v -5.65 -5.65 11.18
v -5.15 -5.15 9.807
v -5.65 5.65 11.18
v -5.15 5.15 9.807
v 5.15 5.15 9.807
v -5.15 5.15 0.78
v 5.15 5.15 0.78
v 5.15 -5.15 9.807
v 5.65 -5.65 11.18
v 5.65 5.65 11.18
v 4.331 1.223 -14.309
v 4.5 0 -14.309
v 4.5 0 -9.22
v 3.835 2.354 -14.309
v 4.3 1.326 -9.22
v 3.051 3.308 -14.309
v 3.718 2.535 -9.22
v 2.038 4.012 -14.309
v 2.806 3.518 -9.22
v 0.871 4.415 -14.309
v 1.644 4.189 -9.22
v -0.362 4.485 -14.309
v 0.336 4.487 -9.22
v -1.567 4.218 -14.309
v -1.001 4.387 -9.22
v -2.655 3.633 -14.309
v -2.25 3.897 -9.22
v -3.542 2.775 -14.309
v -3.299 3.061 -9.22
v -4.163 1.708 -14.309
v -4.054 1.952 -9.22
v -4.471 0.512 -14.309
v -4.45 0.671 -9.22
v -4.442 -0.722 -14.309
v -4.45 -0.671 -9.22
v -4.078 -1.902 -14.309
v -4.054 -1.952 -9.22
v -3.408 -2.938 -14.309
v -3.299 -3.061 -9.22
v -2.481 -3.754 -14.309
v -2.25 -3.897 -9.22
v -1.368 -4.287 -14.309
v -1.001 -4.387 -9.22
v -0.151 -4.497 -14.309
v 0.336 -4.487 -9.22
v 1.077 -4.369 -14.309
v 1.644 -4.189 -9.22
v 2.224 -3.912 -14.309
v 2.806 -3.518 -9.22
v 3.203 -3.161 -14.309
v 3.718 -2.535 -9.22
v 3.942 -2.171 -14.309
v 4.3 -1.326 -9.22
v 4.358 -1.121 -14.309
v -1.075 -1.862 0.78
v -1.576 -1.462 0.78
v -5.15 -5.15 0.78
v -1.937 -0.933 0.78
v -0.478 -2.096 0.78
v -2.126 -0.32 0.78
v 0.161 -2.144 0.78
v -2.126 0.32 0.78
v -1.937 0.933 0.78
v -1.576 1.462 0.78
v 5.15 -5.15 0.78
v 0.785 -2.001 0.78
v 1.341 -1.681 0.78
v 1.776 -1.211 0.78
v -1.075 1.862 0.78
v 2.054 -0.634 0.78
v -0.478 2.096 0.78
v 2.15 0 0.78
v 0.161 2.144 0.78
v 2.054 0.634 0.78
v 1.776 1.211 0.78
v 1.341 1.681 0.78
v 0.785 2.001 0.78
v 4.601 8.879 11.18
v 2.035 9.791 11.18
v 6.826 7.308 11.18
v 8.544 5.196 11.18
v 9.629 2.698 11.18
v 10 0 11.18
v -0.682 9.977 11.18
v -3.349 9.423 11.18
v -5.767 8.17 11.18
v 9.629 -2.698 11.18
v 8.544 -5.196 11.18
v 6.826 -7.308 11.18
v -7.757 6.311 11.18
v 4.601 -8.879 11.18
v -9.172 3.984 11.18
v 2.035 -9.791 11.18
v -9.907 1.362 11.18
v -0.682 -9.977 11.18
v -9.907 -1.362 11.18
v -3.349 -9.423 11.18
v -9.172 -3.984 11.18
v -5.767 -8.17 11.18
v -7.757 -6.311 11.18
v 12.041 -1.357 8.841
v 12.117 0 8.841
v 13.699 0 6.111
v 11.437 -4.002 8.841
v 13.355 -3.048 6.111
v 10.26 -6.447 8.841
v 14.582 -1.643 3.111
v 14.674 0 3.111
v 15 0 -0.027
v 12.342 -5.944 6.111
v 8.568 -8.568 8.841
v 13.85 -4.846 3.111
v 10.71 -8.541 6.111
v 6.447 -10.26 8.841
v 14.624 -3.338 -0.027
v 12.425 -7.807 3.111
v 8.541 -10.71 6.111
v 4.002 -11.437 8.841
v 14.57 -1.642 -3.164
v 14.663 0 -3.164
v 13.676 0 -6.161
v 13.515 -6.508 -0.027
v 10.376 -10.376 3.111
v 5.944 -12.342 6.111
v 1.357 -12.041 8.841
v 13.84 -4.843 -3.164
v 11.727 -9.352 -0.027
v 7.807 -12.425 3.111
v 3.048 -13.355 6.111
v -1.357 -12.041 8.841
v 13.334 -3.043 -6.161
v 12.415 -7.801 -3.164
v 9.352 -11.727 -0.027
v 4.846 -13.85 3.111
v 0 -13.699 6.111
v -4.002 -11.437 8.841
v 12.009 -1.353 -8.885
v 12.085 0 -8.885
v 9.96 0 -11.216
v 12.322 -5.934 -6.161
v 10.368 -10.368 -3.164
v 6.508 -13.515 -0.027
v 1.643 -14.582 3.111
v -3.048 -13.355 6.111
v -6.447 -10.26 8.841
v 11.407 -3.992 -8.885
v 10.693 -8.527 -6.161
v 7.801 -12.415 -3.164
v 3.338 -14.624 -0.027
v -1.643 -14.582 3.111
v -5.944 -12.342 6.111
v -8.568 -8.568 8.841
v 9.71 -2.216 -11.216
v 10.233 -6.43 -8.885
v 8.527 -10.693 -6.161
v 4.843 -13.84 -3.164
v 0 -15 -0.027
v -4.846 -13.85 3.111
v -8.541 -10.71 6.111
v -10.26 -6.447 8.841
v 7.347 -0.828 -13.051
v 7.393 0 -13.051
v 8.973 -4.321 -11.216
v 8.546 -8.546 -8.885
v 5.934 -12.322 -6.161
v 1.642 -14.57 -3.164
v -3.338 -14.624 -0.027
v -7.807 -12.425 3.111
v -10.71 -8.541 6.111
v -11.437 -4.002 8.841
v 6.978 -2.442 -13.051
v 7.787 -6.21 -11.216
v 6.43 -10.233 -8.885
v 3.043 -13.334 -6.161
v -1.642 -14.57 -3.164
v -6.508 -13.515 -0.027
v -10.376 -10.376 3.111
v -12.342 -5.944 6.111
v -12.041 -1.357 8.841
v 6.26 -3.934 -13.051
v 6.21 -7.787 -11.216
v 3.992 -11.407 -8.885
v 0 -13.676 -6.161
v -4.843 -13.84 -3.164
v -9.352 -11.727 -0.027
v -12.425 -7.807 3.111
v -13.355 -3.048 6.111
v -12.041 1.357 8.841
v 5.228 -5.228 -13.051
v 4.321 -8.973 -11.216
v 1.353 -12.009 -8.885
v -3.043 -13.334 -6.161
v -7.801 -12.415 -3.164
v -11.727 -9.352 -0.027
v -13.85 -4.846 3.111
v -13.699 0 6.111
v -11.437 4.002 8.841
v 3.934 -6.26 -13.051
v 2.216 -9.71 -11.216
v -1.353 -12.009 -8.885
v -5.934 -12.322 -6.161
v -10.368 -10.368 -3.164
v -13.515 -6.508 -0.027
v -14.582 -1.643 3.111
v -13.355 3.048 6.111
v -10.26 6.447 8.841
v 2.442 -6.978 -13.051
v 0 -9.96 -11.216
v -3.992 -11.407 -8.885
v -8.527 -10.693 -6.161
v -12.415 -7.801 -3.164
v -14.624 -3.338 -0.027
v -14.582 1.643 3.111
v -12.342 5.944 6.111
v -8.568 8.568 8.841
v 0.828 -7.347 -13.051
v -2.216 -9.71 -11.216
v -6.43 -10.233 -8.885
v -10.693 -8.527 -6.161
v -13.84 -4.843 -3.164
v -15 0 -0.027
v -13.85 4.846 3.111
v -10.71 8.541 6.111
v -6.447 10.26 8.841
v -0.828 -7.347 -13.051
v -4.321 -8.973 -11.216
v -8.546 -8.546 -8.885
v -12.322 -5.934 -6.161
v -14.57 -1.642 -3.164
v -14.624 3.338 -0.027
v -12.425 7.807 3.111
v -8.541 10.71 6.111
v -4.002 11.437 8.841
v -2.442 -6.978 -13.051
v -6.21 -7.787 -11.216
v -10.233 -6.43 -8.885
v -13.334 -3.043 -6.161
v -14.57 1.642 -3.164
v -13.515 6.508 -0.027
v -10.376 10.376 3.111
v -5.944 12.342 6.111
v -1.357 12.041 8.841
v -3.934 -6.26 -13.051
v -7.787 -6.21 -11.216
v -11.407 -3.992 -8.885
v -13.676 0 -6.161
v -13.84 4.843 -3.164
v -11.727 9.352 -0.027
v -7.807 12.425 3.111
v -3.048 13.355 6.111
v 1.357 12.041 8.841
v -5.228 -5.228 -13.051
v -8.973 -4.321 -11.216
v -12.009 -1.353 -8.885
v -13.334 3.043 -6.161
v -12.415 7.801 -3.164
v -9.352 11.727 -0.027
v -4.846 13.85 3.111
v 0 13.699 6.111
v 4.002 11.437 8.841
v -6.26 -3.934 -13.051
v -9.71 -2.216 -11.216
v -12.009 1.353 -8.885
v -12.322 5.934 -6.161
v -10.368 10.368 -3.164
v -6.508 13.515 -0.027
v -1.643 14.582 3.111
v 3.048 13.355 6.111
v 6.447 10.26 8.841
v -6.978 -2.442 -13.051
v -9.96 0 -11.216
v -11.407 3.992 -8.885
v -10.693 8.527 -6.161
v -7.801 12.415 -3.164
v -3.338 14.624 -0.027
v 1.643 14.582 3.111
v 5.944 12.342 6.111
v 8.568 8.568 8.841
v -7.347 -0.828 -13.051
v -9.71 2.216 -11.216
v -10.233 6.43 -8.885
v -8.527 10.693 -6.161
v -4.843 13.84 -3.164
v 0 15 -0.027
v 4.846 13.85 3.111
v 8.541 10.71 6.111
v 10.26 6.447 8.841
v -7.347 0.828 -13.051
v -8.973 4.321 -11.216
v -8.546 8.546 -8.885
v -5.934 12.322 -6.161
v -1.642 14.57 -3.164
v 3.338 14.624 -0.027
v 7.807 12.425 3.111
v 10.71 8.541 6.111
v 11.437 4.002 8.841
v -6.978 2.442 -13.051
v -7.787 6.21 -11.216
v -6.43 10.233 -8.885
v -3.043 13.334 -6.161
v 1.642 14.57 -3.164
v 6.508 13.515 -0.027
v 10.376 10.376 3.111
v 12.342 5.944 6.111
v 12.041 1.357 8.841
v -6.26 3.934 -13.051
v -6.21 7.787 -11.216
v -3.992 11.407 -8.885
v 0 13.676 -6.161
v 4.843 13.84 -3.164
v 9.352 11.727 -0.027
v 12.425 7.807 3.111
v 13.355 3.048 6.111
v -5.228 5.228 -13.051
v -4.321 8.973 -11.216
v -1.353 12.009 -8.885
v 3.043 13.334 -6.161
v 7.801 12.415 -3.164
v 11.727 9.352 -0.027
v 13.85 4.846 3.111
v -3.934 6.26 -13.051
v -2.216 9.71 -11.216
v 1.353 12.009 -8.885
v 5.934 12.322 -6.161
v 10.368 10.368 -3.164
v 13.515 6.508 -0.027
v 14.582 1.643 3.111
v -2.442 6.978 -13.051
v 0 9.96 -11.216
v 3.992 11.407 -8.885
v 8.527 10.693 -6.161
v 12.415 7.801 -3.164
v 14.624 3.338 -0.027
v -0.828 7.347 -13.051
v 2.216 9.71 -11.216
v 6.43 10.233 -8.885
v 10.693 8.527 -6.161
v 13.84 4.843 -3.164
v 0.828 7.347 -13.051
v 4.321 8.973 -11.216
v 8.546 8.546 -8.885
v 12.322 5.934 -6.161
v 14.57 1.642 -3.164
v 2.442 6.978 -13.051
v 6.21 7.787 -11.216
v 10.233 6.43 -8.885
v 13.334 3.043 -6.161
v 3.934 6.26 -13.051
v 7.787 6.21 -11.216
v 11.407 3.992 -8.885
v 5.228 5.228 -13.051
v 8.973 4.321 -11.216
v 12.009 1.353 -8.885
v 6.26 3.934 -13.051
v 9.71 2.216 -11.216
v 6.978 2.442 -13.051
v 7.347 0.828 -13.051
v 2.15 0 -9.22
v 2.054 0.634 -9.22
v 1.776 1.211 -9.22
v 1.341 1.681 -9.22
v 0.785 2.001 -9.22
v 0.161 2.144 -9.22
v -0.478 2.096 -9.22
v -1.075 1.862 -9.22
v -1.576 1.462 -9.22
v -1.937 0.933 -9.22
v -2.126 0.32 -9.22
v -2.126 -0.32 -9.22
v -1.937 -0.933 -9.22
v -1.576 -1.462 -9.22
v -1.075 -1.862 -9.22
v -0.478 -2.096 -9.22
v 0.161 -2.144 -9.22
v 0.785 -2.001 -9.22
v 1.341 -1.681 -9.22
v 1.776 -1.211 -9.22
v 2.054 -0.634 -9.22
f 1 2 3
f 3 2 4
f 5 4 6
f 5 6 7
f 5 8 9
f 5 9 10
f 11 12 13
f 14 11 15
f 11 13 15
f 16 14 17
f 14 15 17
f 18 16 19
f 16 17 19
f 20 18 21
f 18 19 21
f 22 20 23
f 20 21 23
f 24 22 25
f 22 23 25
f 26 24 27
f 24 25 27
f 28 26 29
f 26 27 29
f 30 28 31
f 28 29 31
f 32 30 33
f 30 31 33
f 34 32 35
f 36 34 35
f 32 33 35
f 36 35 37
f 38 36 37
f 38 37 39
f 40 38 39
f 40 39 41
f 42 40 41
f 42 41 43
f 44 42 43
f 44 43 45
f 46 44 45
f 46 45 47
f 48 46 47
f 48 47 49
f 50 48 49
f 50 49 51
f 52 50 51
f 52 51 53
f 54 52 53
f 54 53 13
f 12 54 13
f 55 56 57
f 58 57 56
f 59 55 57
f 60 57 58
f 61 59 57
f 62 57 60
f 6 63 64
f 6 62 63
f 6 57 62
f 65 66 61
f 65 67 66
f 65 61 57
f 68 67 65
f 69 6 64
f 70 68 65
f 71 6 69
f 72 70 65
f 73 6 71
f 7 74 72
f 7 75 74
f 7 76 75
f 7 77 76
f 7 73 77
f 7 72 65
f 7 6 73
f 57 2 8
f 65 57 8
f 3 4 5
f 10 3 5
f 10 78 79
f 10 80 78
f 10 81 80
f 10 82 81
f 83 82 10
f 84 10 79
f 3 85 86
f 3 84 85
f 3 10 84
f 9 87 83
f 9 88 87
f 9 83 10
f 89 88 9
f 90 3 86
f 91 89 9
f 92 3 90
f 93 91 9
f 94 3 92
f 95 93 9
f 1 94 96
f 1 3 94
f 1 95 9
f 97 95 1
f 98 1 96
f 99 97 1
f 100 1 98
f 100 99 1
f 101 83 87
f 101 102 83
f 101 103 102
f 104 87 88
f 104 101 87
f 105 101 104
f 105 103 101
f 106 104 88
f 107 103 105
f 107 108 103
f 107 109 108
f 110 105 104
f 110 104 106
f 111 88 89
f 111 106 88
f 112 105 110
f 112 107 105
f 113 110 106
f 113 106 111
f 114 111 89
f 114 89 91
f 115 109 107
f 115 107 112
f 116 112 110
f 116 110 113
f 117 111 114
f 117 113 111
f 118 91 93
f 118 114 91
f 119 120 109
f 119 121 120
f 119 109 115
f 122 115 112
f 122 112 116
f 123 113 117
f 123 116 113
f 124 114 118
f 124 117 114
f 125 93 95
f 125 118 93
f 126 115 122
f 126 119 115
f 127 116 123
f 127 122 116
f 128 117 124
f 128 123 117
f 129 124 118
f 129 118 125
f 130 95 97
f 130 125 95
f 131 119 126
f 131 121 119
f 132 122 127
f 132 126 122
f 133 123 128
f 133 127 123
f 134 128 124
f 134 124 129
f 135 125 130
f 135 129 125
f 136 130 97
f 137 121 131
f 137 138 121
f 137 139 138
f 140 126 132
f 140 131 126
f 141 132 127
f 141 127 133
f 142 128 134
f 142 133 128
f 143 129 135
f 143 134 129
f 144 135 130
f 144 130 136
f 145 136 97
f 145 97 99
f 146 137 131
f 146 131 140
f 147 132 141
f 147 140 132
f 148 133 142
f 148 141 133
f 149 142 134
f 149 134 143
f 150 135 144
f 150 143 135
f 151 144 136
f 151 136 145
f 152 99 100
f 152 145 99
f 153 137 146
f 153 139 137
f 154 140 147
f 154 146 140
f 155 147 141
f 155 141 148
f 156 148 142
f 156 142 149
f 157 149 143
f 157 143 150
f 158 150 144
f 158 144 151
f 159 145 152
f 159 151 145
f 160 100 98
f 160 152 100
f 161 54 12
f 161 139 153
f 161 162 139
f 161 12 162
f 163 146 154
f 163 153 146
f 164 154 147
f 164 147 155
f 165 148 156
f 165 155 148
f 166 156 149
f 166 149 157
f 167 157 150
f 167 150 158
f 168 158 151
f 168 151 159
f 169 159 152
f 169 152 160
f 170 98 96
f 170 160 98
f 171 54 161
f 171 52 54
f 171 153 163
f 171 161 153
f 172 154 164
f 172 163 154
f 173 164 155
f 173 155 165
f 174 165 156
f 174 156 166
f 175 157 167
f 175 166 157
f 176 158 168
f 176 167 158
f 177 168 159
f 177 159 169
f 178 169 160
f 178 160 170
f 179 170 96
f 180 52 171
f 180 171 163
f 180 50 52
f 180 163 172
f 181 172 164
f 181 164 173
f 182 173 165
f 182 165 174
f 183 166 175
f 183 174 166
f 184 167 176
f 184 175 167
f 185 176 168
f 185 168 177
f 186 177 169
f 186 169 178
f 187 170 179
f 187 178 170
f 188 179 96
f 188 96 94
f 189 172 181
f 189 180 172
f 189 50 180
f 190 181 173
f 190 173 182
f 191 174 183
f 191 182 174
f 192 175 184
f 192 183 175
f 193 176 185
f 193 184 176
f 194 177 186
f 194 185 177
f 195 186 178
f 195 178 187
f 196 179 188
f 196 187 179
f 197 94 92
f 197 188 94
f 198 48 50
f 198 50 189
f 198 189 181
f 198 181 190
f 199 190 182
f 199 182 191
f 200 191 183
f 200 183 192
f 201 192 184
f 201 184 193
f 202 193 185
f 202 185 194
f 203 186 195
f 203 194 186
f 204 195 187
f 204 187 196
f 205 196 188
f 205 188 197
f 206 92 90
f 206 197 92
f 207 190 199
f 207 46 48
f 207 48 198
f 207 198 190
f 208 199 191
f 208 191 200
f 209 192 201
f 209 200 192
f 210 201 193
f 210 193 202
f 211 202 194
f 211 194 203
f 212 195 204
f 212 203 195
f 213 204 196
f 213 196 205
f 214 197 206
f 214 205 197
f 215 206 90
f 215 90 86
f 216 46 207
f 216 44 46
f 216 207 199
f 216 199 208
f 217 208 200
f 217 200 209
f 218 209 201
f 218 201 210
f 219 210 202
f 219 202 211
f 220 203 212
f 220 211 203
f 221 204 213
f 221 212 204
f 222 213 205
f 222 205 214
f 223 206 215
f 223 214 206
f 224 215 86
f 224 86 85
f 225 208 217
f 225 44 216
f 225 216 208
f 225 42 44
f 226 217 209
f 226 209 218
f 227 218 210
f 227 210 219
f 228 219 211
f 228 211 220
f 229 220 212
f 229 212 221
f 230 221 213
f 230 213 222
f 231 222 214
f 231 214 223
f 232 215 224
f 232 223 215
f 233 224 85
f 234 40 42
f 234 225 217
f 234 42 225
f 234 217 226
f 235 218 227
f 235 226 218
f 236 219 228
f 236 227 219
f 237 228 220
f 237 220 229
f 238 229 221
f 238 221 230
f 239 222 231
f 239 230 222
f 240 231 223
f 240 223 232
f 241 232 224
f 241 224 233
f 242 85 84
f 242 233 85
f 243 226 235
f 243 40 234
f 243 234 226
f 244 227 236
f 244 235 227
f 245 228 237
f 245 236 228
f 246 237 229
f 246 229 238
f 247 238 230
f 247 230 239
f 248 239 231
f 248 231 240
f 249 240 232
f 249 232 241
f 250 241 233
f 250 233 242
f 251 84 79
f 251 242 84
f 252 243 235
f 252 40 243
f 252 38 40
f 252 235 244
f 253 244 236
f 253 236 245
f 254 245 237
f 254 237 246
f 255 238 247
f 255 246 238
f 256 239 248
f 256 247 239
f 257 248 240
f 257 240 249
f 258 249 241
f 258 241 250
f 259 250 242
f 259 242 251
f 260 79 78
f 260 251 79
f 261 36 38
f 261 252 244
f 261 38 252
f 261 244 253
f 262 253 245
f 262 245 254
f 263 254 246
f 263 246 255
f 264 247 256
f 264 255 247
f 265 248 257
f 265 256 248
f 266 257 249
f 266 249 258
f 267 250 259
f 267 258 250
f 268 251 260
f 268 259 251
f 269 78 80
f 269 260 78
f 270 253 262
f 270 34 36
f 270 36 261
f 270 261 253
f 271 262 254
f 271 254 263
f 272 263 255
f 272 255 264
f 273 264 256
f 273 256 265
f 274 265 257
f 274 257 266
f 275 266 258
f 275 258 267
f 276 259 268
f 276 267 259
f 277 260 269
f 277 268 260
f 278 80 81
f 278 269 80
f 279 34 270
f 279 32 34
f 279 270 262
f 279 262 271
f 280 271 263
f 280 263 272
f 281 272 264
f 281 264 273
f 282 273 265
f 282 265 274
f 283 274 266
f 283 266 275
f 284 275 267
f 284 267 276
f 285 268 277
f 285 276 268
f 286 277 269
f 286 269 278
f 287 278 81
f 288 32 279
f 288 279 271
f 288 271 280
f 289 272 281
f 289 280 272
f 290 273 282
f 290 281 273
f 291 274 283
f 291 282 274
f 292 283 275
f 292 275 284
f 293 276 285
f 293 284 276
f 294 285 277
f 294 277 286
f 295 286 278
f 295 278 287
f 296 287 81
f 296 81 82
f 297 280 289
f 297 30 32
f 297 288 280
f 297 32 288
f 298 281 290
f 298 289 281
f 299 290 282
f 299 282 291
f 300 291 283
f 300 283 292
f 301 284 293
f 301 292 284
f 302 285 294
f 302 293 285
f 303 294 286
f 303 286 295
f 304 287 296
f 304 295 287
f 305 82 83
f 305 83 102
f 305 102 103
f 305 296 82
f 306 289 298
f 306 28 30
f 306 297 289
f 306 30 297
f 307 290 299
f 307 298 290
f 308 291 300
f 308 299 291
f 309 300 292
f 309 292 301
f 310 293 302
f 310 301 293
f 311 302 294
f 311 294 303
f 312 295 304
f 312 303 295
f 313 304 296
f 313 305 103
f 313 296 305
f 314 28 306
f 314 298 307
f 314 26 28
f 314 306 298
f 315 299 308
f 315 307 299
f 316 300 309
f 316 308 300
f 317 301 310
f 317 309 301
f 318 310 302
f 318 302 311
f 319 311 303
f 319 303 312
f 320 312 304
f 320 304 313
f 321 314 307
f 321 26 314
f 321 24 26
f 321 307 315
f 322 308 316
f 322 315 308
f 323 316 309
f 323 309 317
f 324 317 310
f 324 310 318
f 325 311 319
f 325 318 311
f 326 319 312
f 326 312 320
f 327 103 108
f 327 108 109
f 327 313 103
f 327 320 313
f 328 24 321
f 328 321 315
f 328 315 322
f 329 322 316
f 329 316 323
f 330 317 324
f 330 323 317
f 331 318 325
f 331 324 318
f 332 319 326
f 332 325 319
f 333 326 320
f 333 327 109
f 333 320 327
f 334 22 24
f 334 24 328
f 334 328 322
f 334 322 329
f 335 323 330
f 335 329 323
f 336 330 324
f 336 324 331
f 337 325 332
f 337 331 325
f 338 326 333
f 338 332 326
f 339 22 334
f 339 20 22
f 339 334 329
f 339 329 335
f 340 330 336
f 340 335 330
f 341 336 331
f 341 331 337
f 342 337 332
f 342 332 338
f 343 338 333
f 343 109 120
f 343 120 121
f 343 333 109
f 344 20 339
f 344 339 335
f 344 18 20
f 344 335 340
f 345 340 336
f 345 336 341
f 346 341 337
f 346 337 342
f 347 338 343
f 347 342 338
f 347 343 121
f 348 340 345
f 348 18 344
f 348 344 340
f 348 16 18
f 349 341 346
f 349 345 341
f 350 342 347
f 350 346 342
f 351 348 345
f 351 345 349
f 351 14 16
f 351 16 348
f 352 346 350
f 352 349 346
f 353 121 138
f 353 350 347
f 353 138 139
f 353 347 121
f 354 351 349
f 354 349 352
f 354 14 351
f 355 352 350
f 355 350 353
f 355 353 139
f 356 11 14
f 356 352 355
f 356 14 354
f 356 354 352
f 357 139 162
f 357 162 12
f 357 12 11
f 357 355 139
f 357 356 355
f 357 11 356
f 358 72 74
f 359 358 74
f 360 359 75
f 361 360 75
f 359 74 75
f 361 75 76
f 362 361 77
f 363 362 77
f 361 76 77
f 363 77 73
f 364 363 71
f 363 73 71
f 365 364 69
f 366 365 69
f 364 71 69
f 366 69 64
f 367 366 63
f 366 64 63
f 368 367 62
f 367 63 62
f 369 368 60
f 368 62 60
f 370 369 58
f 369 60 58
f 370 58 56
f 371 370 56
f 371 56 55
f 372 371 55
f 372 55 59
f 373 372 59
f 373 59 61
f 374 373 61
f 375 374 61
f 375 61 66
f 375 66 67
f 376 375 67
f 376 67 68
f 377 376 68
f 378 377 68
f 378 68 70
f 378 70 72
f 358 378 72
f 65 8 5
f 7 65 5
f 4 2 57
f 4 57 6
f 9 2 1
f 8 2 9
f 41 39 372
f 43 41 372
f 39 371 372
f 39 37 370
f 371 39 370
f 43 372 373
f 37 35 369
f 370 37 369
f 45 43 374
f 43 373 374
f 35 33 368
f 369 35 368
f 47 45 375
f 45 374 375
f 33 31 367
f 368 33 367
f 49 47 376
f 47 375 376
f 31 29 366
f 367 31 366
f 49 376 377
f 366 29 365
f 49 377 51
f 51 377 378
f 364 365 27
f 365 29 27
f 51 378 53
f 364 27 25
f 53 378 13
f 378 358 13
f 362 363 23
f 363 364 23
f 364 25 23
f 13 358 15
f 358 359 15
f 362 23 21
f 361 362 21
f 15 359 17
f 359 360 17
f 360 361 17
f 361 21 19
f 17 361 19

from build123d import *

# Parameters (mm, degrees)
SKETCH3_W          = 10.3
SKETCH3_H          = 10.3
CUT_EXTRUDE1_DEPTH = 10.4
SKETCH4_R          = 2.15
CUT_EXTRUDE2_DEPTH = 16.780339887
CUT_EXTRUDE3_START = -10
SKETCH5_R          = 4.5
CUT_EXTRUDE3_DEPTH = 6.62545693
CHAMFER1_SIZE      = 0.5
CHAMFER1_SIZE2     = 1.37373871


with BuildPart() as part:
    # Sketch2 → Revolve1 (revolve)
    with BuildSketch(Plane(origin=(0, 0, 0), x_dir=(1, 0, 0), z_dir=(0, 1, 0))):
        with BuildLine():
            Line((0, 15), (0, -11.180339887))
            Line((0, -11.180339887), (10, -11.180339887))
            ThreePointArc((10, -11.180339887), (14.012585384, 5.352331347), (0, 15))
        make_face()
    revolve(axis=Axis((0, 0, 15), (0, 0, -1)))

    # Sketch3 → Cut-Extrude1 (cut)
    with BuildSketch(Plane.XY.offset(11.180339887)):
        Rectangle(SKETCH3_W, SKETCH3_H)
    extrude(amount=-CUT_EXTRUDE1_DEPTH, mode=Mode.SUBTRACT)

    # Sketch4 → Cut-Extrude2 (cut, through all)
    with BuildSketch(Plane.XY.offset(0.780339887)):
        Circle(SKETCH4_R)
    extrude(amount=-CUT_EXTRUDE2_DEPTH, mode=Mode.SUBTRACT)

    # Sketch5 → Cut-Extrude3 (cut, through all)
    with BuildSketch(Plane.XY.offset(0.780339887).offset(CUT_EXTRUDE3_START)):
        Circle(SKETCH5_R)
    extrude(amount=-CUT_EXTRUDE3_DEPTH, mode=Mode.SUBTRACT)

    # Chamfer1
    chamfer1_edges = [part.edges().sort_by_distance(p)[0] for p in [
        (5.15, 0, 11.180339887),
        (0, 5.15, 11.180339887),
        (-5.15, 0, 11.180339887),
        (0, -5.15, 11.180339887),
    ]]
    chamfer1_side = [part.faces().sort_by_distance(p)[0] for p in [
        (-9.717157288, 0, 11.180339887),
    ]]
    chamfer(chamfer1_edges, length=CHAMFER1_SIZE, length2=CHAMFER1_SIZE2, reference=chamfer1_side[0])


solid = part.part
